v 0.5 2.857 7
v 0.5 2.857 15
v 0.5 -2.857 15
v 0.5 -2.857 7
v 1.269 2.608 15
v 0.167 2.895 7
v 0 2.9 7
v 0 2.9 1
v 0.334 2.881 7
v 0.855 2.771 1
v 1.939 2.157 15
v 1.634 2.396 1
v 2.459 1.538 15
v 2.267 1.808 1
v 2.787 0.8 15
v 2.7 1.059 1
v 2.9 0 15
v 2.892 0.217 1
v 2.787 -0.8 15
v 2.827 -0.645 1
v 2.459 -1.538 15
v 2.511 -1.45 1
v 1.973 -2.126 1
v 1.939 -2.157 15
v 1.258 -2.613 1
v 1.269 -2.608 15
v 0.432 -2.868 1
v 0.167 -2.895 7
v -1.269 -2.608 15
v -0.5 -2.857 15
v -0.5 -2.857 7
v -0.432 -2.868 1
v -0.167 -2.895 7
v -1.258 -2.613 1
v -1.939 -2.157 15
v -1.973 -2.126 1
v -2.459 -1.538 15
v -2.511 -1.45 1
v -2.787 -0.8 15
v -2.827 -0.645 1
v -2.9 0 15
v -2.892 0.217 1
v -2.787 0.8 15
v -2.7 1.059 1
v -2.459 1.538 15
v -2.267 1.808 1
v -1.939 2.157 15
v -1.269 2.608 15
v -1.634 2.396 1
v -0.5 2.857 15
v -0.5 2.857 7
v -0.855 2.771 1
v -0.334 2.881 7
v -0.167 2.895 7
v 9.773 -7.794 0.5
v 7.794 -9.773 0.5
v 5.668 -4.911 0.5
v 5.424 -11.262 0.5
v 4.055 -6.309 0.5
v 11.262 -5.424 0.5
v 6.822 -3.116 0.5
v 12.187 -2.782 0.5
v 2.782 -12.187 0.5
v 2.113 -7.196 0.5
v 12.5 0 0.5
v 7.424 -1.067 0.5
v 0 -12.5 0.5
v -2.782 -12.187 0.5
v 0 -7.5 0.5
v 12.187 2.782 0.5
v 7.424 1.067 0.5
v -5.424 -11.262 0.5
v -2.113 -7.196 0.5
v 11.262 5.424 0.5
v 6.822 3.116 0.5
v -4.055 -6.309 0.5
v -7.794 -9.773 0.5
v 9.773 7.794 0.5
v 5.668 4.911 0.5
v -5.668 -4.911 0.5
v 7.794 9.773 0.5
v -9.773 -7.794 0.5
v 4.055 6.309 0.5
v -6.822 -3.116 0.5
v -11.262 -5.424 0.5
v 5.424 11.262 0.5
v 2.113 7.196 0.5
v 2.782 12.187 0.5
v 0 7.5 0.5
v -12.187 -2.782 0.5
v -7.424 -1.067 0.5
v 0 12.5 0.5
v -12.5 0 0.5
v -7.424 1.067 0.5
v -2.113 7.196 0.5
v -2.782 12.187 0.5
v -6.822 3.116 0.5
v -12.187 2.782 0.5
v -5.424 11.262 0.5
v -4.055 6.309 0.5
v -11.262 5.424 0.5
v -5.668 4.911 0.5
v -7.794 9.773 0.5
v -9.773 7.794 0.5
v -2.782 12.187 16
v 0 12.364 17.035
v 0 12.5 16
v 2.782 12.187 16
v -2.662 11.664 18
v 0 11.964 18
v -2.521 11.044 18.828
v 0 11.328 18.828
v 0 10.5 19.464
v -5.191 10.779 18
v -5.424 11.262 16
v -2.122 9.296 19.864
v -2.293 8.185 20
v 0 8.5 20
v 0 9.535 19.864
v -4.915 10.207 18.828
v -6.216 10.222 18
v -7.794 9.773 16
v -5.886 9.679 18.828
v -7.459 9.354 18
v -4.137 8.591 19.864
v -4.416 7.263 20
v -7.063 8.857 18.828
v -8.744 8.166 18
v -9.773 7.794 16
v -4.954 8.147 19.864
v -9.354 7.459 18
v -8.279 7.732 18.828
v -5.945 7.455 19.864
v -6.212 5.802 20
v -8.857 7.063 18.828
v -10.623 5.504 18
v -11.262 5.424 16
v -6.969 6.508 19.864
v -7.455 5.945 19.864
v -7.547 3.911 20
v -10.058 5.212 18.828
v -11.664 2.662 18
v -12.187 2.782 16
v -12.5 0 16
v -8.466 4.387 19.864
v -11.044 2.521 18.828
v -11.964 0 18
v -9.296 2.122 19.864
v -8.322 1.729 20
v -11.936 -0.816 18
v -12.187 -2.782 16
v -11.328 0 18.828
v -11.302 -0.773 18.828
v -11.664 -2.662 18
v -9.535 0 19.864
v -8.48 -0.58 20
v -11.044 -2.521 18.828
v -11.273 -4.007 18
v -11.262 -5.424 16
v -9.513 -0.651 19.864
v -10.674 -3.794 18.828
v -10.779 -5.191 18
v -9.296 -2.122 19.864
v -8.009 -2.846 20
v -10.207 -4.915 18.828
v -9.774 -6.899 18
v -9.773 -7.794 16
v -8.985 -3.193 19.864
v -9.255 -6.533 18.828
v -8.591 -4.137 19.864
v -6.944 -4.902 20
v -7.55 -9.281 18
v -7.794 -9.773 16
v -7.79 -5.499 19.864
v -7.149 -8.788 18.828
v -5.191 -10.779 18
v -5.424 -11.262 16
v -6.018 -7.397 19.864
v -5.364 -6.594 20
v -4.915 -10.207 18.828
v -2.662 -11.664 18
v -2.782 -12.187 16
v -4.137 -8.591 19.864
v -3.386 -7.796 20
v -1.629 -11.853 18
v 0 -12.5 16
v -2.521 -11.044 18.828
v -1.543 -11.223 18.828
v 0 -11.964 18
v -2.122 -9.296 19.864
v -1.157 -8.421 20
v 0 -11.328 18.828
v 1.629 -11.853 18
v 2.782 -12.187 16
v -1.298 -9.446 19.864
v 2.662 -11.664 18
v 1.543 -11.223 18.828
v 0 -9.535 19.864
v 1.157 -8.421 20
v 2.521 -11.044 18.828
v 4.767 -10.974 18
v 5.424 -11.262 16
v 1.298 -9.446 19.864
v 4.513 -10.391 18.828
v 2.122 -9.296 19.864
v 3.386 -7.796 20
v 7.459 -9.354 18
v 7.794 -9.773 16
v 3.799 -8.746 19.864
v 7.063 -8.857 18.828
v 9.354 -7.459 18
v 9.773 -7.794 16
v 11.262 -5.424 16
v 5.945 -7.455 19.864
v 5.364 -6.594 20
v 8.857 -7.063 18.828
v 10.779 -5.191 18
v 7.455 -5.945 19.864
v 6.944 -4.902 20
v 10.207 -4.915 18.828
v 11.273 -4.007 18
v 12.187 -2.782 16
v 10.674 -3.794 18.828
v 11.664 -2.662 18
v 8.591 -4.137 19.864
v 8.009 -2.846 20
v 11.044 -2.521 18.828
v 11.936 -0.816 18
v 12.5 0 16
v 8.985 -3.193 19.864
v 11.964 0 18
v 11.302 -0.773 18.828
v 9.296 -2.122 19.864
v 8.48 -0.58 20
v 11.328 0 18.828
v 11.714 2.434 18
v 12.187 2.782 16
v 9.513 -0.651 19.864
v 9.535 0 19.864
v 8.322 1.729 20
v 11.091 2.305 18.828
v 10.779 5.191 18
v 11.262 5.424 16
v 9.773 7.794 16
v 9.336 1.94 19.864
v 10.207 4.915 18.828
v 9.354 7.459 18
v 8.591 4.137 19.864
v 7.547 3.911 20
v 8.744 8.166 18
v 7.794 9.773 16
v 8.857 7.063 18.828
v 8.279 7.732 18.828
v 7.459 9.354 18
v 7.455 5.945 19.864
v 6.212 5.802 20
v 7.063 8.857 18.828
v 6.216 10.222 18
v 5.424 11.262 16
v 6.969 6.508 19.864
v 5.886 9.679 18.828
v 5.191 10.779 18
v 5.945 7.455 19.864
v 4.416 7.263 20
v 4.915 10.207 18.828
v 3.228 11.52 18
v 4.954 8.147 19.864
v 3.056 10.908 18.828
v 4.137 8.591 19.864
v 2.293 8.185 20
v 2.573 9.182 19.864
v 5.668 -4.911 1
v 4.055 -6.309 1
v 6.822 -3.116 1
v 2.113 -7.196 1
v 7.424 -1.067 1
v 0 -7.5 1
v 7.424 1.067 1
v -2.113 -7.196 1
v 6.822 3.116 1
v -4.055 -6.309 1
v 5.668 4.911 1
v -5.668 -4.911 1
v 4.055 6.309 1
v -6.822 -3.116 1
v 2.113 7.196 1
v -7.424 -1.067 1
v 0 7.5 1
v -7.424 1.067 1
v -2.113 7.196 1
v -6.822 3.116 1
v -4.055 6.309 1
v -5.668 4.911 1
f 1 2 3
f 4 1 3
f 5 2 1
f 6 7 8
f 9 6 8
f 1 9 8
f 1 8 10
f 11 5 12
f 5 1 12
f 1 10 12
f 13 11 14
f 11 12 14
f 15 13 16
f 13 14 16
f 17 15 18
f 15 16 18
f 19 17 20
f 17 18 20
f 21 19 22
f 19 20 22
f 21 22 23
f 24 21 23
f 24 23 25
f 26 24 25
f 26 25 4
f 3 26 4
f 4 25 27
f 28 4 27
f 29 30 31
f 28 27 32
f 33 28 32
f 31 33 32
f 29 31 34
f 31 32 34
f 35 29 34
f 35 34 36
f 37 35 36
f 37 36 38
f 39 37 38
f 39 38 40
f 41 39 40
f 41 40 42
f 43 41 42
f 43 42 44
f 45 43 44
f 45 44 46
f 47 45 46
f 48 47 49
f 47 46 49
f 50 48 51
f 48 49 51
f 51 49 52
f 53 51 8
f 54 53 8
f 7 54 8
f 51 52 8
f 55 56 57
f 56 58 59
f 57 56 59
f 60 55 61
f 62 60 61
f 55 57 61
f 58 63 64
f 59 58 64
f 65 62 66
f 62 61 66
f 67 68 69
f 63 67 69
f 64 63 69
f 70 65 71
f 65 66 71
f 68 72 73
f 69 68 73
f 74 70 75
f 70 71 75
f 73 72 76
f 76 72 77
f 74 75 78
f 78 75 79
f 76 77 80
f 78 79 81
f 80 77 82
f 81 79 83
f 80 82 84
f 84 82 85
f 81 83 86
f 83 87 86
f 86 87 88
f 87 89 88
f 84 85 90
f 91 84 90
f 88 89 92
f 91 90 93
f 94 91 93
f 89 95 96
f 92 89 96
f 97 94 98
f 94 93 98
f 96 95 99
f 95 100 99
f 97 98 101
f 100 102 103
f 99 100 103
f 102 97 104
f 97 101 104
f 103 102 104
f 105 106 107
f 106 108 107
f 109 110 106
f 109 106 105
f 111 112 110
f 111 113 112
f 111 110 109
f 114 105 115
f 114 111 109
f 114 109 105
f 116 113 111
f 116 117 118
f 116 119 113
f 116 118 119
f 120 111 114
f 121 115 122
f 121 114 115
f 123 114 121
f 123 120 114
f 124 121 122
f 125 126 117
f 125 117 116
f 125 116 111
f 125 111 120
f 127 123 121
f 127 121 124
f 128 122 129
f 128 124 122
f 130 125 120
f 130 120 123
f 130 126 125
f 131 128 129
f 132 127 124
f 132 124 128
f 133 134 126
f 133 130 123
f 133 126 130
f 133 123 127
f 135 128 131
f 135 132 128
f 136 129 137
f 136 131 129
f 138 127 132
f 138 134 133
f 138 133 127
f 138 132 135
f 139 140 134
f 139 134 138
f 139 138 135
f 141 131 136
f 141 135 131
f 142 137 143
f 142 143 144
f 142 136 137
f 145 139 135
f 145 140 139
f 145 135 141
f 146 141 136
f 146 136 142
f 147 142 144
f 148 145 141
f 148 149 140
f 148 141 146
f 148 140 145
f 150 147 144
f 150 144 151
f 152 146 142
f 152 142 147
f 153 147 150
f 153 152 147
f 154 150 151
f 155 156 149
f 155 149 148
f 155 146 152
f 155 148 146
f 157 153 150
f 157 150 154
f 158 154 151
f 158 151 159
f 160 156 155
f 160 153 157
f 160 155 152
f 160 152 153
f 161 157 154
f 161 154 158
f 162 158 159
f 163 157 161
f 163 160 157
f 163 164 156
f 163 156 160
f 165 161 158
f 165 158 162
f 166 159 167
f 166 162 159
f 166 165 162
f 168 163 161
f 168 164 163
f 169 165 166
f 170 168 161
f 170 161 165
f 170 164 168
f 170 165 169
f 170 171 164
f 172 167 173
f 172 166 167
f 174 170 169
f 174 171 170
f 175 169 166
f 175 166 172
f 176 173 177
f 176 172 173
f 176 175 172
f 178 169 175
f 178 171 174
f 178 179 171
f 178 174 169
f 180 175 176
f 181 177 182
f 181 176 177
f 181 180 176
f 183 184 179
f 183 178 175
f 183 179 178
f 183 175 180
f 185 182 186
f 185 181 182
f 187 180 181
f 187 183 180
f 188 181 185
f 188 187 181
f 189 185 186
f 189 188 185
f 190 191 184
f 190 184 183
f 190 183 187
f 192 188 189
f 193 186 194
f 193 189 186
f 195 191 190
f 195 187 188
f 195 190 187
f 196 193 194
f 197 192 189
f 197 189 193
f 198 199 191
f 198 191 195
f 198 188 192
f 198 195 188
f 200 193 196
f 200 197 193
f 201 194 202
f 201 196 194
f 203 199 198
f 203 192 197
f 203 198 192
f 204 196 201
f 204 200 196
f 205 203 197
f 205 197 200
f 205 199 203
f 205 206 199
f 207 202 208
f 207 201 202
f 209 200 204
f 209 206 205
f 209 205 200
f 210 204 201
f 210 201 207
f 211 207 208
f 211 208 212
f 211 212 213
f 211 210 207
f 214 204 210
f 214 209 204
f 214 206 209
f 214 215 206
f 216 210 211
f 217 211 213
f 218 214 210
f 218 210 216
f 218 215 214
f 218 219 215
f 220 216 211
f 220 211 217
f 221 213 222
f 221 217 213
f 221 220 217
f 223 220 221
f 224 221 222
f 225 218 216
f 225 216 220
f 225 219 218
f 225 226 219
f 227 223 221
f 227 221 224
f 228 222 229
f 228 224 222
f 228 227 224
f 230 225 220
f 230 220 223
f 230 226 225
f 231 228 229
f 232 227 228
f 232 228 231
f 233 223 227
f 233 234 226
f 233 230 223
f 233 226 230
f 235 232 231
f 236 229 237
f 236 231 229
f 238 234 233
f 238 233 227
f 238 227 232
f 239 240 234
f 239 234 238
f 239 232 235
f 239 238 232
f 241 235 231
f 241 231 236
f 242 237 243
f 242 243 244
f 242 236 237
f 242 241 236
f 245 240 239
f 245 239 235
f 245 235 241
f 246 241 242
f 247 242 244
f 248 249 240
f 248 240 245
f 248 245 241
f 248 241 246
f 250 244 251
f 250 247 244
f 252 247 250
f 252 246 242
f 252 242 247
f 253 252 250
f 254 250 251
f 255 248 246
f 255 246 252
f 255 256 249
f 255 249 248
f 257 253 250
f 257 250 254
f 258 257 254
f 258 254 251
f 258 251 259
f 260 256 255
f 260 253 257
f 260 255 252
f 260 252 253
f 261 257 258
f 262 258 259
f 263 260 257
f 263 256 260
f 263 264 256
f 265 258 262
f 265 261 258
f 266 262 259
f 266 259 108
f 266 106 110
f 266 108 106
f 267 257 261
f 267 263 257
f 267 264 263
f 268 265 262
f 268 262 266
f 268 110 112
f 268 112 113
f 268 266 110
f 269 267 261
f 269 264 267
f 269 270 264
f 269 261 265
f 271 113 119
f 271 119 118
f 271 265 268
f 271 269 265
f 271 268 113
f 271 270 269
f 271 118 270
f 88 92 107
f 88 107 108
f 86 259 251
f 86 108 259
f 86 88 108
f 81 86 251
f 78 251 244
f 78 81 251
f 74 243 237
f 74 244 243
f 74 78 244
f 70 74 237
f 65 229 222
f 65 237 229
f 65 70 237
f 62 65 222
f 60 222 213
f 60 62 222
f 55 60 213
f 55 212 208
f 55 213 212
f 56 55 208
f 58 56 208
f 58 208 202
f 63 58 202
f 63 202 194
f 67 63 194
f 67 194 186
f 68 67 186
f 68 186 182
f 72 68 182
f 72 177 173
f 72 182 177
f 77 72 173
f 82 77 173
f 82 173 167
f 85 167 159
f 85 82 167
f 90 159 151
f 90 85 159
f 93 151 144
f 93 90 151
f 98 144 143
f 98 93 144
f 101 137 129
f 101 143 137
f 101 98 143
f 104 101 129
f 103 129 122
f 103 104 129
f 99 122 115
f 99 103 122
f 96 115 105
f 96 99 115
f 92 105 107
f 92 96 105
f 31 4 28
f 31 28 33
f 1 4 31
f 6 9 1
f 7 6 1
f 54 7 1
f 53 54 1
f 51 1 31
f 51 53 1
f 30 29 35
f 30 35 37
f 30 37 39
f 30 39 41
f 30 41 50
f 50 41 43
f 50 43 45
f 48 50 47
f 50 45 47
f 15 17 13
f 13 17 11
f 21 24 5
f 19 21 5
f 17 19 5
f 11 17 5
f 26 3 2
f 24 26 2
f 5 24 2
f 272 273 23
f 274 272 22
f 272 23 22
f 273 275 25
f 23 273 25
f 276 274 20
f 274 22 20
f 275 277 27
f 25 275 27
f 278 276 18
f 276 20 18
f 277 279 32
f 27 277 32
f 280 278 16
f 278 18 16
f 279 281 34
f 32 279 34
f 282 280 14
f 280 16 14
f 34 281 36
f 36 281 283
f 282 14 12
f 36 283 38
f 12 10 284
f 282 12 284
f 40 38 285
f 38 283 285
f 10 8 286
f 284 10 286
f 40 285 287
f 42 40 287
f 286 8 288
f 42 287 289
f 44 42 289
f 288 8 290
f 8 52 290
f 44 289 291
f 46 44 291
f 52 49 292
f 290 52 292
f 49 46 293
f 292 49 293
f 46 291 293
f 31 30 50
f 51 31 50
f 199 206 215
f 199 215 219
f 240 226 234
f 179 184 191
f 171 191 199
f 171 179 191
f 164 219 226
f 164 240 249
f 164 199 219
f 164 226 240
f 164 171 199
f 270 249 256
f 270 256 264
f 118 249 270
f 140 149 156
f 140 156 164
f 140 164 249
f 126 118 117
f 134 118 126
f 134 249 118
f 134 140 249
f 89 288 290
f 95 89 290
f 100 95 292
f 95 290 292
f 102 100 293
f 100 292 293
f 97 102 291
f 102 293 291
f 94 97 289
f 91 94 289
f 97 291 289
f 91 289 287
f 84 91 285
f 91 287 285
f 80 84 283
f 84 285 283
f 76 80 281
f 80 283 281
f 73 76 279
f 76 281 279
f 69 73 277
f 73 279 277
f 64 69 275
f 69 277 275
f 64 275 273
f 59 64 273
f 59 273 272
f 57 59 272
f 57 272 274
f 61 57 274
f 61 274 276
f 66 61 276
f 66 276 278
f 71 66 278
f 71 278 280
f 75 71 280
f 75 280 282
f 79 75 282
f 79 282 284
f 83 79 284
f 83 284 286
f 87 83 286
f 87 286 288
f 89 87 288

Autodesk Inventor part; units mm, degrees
ref_plane "YZ Plane" through (0, 0, 0) normal (1, 0, 0) x (0, 1, 0)
ref_plane "XZ Plane" through (0, 0, 0) normal (0, 1, 0) x (-1, 0, 0)
ref_plane "XY Plane" through (0, 0, 0) normal (0, 0, 1) x (1, 0, 0)
sketch "Sketch1" plane through (0, 0, 0) normal (1, 0, 0) x (0, 1, 0)
  line L0 (12.5, 0) -> (-12.5, 0) projected
  line L1 (12.5, 0) -> (7.5, 0)
  line L2 (7.5, 0) -> (7.5, 20)
  line L3 (7.5, 20) -> (8.5, 20)
  line L4 (12.5, 16) -> (12.5, 0)
  line L5 (12.5, 20) -> (0, 20)
  line L6 (0, 20) -> (0, 15)
  line L7 (0, 15) -> (12.5, 15)
  line L8 (12.5, 15) -> (12.5, 20)
  arc A0 (12.5, 16) -> (8.5, 20) centre (8.5, 16) ccw
  line L9 (0, 15) -> (2.9, 15)
  line L10 (2.9, 15) -> (2.9, 1)
  line L11 (2.9, 1) -> (7.5, 1)
  line L12 (12.5, 0) -> (12.5, 0.5)
  line L13 (12.5, 0.5) -> (7.5, 0.5)
  line L14 (0, 15) -> (0.5, 15)
  line L15 (0.5, 15) -> (0.5, 7)
  line L16 (0.5, 7) -> (0, 7)
  line L17 (0, 7) -> (0, 15)
  point P0 (0, 0)
  dimension "d0" = 5
  dimension "d1" = 20
  dimension "d2" = 5
  dimension "d3" = 4
  dimension "d5" = 14
  dimension "d6" = 0.5
  dimension "d7" = 0.5
  dimension "d8" = 8
revolve "Revolution1" add sketch "Sketch1" angle 360 about axis through (0, 0, 7) along (0, 0, 1) contours L13 L2 L7 L4 | L7 L2 L3 A0 L4 | L11 L10 L7 L2 | L7 L6 L5 L2
sketch "Sketch2" plane through (0, 0, 15) normal (0, 0, -1) x (-1, 0, 0)
  line L0 (0.5, 5) -> (-0.5, 5)
  line L1 (-0.5, 5) -> (-0.5, -5)
  line L2 (-0.5, -5) -> (0.5, -5)
  line L3 (0.5, -5) -> (0.5, 5)
  line L4 (0.5, 5) -> (-0.5, -5) construction
  line L5 (-0.5, 5) -> (0.5, -5) construction
  point P0 (0, 0)
  dimension "d10" = 1
  dimension "d11" = 10
extrude "Extrusion1" add sketch "Sketch2" along normal blind 8
properties part number "Brightness"
